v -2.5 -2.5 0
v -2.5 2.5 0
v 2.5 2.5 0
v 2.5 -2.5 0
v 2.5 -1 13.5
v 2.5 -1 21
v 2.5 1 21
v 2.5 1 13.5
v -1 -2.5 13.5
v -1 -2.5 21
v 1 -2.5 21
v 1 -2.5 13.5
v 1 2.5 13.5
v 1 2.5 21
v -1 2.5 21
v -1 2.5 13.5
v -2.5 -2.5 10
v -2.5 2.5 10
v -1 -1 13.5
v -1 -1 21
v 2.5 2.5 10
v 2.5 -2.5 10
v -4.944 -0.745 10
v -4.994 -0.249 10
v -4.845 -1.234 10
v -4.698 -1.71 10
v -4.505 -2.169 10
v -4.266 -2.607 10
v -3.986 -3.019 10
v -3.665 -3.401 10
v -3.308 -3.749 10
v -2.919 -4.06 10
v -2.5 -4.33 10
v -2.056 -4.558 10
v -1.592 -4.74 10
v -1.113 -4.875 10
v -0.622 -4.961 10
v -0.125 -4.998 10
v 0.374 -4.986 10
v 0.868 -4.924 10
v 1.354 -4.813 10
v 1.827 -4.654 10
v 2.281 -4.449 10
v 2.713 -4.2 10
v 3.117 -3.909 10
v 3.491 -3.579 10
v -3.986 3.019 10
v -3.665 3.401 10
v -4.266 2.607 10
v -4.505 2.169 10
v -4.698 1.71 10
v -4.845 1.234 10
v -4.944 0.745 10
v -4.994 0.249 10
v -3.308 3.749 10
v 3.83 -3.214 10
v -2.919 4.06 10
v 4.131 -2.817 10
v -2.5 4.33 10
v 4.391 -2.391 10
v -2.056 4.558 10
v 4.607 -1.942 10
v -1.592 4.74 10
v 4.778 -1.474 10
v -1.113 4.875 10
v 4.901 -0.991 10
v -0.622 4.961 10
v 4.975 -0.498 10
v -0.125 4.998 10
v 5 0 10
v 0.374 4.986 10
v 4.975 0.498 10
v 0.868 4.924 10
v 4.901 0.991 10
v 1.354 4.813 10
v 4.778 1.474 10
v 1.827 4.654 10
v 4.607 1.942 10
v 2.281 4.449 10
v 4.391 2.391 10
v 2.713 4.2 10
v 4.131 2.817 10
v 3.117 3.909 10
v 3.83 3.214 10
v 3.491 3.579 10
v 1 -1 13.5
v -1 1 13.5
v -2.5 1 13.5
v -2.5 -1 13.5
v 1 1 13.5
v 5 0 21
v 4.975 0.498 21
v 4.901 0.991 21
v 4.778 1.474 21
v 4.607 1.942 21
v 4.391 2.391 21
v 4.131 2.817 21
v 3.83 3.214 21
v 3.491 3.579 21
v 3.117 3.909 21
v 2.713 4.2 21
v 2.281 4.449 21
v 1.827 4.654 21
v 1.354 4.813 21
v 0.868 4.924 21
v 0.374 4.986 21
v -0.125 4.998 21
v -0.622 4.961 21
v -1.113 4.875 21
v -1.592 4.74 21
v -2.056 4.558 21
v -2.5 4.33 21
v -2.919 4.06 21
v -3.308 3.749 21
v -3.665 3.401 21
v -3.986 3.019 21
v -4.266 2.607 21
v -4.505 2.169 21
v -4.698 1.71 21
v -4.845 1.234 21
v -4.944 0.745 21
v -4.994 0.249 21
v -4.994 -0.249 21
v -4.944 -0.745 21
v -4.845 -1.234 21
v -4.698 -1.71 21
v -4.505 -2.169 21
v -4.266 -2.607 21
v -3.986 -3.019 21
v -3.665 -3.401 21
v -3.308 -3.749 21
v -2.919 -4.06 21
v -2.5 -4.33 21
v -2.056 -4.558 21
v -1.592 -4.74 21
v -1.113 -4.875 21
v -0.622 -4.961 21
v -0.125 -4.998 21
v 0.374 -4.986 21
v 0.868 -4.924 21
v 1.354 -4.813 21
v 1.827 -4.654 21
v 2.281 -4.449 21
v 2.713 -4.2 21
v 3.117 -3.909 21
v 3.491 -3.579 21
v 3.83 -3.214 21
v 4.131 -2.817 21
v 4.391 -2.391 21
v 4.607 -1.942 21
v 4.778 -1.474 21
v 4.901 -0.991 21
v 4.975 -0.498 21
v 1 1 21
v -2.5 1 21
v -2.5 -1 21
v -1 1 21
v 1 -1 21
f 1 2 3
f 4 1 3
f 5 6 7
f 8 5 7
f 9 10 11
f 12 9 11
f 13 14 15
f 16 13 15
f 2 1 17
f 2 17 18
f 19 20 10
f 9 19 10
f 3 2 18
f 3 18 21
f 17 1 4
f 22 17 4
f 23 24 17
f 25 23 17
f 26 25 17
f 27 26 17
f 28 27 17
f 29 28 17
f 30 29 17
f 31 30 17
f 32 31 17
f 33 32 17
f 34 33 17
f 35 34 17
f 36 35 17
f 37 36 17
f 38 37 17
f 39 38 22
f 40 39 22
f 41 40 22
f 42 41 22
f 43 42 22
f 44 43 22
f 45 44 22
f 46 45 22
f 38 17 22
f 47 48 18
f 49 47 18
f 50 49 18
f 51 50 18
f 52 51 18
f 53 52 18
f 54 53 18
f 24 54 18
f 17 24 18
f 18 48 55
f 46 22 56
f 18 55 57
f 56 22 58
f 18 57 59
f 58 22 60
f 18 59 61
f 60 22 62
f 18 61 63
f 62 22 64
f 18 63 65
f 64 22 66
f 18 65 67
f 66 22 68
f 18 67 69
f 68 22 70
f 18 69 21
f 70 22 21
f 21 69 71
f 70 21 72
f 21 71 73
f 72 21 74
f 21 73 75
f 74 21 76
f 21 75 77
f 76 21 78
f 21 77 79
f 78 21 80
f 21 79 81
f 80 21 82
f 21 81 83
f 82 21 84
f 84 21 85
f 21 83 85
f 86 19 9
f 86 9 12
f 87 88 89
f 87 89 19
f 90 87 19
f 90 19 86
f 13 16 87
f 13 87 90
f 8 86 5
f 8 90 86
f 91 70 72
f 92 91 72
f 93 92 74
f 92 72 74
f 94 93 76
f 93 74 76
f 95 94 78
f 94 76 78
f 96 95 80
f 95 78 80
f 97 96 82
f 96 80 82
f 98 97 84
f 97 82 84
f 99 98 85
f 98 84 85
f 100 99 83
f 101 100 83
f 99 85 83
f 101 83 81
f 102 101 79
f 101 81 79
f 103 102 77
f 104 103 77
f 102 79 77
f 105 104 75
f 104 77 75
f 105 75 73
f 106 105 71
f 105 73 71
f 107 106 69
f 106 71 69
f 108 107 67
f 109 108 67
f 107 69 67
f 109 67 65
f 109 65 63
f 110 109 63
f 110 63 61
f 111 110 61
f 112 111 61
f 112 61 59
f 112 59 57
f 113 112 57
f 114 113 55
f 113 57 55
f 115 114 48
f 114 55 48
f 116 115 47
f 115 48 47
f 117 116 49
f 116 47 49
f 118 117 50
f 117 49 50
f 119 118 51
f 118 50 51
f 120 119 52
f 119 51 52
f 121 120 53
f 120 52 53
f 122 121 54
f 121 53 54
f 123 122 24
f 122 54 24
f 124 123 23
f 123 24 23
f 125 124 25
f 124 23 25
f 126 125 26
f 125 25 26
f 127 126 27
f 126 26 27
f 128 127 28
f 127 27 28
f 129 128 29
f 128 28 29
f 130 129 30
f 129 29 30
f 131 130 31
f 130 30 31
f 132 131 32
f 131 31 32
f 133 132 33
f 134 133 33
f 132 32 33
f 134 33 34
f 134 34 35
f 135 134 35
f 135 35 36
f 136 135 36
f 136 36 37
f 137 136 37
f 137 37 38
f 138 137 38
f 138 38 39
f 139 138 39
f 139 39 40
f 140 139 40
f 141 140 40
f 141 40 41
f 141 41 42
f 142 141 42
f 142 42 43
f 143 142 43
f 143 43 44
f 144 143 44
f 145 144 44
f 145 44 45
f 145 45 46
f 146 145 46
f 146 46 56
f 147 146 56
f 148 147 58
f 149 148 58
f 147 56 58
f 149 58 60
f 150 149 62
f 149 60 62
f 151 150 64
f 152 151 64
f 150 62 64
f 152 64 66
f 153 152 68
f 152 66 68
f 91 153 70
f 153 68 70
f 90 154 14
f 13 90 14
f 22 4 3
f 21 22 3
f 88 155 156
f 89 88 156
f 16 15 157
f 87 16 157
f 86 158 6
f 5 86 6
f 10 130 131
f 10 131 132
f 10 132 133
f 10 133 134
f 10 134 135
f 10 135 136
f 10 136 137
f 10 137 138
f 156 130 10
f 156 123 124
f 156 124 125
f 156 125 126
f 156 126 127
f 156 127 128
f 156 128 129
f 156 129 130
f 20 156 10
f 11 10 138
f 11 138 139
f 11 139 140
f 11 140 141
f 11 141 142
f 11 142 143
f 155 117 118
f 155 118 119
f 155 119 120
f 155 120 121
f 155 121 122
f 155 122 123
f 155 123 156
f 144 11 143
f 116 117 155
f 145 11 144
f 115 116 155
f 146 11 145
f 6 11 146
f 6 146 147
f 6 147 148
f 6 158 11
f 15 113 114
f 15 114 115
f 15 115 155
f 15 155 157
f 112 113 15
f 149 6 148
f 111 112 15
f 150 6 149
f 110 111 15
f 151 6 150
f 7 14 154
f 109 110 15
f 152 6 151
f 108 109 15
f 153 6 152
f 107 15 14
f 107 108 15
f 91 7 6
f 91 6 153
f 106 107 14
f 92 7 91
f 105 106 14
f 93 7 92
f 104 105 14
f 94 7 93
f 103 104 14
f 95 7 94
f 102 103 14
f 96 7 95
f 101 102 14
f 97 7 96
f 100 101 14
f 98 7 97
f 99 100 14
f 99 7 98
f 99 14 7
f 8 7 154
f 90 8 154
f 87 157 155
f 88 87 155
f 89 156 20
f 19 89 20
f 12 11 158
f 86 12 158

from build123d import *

# Parameters (mm, degrees)
F0_W     = 5
F0_H     = 5
F1_DEPTH = 10
F2_R     = 5
F2_W     = 5
F2_H     = 5
F3_DEPTH = 11
F5_DEPTH = 7.5


with BuildPart() as f1:
    # F0 (on Top) → F1 (new body)
    with BuildSketch(Plane.XY):
        Rectangle(F0_W, F0_H)
    extrude(amount=F1_DEPTH)

    # F2 (on face) → F3 (join)
    with BuildSketch(Plane.XY.offset(10)):
        Circle(F2_R)
        Rectangle(F2_W, F2_H, mode=Mode.SUBTRACT)
        Rectangle(F2_W, F2_H)
    extrude(amount=F3_DEPTH)

    # F4 (on face) → F5 (cut)
    with BuildSketch(Plane.XY.offset(21)):
        Polygon((1, 2.5), (-1, 2.5), (-1, 1), (-2.5, 1), (-2.5, -1), (-1, -1), (-1, -2.5), (1, -2.5), (1, -1), (2.5, -1), (2.5, 1), (1, 1), align=None)
    extrude(amount=-F5_DEPTH, mode=Mode.SUBTRACT)


solid = f1.part
